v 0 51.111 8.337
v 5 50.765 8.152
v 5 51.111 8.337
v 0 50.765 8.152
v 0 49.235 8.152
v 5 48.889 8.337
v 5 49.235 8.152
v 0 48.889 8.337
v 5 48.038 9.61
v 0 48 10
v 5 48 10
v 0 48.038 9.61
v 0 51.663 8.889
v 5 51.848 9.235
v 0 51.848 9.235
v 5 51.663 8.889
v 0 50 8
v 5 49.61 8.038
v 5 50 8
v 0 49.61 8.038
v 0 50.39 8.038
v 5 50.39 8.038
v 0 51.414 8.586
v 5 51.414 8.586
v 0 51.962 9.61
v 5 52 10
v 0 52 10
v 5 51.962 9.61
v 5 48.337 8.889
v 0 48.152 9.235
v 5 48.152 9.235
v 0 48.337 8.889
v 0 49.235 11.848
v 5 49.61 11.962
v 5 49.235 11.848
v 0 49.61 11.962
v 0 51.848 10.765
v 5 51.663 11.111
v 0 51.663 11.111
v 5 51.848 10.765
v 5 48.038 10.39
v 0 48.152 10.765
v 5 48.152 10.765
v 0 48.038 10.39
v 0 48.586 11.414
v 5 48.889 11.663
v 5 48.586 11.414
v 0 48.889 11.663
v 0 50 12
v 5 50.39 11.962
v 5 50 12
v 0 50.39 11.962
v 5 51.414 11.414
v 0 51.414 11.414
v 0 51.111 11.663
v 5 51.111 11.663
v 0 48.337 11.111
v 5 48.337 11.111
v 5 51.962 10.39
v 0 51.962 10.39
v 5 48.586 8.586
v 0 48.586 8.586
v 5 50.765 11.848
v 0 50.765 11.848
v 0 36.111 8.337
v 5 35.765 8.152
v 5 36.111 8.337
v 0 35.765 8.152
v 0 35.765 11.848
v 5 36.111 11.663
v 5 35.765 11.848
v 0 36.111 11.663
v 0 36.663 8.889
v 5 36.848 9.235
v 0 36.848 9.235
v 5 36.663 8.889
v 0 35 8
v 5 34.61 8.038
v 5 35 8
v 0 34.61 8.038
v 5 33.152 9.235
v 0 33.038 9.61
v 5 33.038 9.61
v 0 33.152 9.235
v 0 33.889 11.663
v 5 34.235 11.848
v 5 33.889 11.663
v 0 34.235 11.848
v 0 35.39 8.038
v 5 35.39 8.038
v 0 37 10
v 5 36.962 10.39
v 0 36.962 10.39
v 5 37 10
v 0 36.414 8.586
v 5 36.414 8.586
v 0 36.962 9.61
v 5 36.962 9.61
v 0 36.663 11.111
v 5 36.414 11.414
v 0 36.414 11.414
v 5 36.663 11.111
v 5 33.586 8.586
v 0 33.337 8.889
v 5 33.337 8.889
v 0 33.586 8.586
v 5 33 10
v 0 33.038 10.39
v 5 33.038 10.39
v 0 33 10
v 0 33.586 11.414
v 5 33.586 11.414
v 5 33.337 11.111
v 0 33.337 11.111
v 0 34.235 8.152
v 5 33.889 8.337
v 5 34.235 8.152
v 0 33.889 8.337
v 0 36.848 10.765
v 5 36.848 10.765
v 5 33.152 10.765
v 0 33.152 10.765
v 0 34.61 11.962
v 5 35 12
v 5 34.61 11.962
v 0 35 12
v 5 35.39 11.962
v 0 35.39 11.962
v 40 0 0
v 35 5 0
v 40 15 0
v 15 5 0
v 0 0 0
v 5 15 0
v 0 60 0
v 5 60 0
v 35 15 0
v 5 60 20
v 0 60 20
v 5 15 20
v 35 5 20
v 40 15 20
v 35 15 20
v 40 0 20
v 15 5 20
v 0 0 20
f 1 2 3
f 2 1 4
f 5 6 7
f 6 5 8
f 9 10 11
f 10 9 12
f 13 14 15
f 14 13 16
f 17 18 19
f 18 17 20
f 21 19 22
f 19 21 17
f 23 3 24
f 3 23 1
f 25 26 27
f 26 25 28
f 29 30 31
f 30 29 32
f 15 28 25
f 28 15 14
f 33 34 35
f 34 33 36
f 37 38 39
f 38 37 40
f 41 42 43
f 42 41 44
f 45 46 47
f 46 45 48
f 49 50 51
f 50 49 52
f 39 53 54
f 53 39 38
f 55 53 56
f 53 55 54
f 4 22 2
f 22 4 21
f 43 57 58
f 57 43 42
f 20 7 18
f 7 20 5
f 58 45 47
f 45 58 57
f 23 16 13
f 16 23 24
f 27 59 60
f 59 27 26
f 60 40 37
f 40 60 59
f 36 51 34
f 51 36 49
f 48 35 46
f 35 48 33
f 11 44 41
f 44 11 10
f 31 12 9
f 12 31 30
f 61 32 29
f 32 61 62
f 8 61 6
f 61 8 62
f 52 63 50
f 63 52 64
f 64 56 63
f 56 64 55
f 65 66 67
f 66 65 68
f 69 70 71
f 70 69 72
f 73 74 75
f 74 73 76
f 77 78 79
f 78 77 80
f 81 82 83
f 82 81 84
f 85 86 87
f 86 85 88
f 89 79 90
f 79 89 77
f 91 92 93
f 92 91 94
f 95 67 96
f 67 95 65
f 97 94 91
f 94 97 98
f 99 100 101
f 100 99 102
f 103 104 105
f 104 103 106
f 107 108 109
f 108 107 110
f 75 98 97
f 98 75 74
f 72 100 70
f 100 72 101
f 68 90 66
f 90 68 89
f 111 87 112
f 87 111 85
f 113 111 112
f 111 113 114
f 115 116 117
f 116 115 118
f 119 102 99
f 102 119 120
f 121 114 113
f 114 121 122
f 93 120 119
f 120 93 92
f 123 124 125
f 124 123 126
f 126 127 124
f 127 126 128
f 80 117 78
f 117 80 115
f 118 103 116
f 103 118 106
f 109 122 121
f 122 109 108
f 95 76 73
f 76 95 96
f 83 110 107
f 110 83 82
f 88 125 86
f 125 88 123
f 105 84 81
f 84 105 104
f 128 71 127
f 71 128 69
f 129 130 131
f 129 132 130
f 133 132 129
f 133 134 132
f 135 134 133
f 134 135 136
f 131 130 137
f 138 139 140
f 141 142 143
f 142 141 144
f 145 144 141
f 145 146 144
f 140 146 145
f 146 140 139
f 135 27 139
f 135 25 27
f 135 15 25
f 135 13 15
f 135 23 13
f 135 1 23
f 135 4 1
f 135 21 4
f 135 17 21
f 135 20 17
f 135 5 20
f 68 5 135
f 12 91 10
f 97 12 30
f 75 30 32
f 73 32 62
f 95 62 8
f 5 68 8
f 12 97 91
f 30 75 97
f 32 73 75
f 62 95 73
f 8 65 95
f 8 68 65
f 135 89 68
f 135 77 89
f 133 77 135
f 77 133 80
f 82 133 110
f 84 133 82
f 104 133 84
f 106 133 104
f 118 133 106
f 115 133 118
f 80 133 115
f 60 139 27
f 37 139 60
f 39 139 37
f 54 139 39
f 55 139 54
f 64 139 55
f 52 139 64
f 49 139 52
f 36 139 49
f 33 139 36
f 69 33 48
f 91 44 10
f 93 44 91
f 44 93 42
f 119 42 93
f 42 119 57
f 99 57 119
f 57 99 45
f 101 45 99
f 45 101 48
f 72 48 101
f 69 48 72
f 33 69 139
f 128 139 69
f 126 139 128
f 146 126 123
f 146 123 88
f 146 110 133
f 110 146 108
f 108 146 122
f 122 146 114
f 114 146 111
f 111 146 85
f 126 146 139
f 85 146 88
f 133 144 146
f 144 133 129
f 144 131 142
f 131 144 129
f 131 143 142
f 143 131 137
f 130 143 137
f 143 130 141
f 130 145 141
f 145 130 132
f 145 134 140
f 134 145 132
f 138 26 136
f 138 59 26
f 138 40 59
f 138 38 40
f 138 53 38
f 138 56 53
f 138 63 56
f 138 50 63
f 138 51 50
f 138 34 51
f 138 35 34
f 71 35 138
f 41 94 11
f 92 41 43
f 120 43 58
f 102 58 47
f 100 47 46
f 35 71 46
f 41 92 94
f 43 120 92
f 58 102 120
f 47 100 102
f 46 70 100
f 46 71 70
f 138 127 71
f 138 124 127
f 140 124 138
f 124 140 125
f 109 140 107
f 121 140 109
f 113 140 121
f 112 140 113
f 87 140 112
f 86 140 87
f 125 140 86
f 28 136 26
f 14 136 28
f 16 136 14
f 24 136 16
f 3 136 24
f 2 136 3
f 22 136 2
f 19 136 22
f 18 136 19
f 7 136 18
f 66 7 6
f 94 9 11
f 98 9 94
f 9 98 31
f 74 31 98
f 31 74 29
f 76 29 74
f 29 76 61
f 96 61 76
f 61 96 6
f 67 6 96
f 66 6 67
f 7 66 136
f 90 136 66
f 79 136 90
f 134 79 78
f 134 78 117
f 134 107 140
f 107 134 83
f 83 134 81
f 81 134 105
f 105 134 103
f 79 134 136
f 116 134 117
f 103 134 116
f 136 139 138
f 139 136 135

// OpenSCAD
// Gancio a muro: piastra con due fori per le viti e braccio con punta rialzata.
// Si stampa coricato su un fianco, così è più robusto.
larghezza = 20;
altezza = 60;      // altezza della piastra
sporgenza = 40;    // lunghezza del braccio
spessore = 5;
diametro_foro = 4;

punta = 15;
$fn = 32;

difference() {
    linear_extrude(larghezza) union() {
        square([spessore, altezza]);                                  // piastra
        square([sporgenza, spessore]);                                // braccio
        translate([sporgenza - spessore, 0]) square([spessore, punta]);   // punta
        // raccordo tra piastra e braccio
        polygon([[spessore, spessore], [spessore + 10, spessore], [spessore, spessore + 10]]);
    }
    for (y = [altezza - 10, altezza / 2 + 5])
        translate([-1, y, larghezza / 2]) rotate([0, 90, 0]) cylinder(d = diametro_foro, h = spessore + 2);
}
